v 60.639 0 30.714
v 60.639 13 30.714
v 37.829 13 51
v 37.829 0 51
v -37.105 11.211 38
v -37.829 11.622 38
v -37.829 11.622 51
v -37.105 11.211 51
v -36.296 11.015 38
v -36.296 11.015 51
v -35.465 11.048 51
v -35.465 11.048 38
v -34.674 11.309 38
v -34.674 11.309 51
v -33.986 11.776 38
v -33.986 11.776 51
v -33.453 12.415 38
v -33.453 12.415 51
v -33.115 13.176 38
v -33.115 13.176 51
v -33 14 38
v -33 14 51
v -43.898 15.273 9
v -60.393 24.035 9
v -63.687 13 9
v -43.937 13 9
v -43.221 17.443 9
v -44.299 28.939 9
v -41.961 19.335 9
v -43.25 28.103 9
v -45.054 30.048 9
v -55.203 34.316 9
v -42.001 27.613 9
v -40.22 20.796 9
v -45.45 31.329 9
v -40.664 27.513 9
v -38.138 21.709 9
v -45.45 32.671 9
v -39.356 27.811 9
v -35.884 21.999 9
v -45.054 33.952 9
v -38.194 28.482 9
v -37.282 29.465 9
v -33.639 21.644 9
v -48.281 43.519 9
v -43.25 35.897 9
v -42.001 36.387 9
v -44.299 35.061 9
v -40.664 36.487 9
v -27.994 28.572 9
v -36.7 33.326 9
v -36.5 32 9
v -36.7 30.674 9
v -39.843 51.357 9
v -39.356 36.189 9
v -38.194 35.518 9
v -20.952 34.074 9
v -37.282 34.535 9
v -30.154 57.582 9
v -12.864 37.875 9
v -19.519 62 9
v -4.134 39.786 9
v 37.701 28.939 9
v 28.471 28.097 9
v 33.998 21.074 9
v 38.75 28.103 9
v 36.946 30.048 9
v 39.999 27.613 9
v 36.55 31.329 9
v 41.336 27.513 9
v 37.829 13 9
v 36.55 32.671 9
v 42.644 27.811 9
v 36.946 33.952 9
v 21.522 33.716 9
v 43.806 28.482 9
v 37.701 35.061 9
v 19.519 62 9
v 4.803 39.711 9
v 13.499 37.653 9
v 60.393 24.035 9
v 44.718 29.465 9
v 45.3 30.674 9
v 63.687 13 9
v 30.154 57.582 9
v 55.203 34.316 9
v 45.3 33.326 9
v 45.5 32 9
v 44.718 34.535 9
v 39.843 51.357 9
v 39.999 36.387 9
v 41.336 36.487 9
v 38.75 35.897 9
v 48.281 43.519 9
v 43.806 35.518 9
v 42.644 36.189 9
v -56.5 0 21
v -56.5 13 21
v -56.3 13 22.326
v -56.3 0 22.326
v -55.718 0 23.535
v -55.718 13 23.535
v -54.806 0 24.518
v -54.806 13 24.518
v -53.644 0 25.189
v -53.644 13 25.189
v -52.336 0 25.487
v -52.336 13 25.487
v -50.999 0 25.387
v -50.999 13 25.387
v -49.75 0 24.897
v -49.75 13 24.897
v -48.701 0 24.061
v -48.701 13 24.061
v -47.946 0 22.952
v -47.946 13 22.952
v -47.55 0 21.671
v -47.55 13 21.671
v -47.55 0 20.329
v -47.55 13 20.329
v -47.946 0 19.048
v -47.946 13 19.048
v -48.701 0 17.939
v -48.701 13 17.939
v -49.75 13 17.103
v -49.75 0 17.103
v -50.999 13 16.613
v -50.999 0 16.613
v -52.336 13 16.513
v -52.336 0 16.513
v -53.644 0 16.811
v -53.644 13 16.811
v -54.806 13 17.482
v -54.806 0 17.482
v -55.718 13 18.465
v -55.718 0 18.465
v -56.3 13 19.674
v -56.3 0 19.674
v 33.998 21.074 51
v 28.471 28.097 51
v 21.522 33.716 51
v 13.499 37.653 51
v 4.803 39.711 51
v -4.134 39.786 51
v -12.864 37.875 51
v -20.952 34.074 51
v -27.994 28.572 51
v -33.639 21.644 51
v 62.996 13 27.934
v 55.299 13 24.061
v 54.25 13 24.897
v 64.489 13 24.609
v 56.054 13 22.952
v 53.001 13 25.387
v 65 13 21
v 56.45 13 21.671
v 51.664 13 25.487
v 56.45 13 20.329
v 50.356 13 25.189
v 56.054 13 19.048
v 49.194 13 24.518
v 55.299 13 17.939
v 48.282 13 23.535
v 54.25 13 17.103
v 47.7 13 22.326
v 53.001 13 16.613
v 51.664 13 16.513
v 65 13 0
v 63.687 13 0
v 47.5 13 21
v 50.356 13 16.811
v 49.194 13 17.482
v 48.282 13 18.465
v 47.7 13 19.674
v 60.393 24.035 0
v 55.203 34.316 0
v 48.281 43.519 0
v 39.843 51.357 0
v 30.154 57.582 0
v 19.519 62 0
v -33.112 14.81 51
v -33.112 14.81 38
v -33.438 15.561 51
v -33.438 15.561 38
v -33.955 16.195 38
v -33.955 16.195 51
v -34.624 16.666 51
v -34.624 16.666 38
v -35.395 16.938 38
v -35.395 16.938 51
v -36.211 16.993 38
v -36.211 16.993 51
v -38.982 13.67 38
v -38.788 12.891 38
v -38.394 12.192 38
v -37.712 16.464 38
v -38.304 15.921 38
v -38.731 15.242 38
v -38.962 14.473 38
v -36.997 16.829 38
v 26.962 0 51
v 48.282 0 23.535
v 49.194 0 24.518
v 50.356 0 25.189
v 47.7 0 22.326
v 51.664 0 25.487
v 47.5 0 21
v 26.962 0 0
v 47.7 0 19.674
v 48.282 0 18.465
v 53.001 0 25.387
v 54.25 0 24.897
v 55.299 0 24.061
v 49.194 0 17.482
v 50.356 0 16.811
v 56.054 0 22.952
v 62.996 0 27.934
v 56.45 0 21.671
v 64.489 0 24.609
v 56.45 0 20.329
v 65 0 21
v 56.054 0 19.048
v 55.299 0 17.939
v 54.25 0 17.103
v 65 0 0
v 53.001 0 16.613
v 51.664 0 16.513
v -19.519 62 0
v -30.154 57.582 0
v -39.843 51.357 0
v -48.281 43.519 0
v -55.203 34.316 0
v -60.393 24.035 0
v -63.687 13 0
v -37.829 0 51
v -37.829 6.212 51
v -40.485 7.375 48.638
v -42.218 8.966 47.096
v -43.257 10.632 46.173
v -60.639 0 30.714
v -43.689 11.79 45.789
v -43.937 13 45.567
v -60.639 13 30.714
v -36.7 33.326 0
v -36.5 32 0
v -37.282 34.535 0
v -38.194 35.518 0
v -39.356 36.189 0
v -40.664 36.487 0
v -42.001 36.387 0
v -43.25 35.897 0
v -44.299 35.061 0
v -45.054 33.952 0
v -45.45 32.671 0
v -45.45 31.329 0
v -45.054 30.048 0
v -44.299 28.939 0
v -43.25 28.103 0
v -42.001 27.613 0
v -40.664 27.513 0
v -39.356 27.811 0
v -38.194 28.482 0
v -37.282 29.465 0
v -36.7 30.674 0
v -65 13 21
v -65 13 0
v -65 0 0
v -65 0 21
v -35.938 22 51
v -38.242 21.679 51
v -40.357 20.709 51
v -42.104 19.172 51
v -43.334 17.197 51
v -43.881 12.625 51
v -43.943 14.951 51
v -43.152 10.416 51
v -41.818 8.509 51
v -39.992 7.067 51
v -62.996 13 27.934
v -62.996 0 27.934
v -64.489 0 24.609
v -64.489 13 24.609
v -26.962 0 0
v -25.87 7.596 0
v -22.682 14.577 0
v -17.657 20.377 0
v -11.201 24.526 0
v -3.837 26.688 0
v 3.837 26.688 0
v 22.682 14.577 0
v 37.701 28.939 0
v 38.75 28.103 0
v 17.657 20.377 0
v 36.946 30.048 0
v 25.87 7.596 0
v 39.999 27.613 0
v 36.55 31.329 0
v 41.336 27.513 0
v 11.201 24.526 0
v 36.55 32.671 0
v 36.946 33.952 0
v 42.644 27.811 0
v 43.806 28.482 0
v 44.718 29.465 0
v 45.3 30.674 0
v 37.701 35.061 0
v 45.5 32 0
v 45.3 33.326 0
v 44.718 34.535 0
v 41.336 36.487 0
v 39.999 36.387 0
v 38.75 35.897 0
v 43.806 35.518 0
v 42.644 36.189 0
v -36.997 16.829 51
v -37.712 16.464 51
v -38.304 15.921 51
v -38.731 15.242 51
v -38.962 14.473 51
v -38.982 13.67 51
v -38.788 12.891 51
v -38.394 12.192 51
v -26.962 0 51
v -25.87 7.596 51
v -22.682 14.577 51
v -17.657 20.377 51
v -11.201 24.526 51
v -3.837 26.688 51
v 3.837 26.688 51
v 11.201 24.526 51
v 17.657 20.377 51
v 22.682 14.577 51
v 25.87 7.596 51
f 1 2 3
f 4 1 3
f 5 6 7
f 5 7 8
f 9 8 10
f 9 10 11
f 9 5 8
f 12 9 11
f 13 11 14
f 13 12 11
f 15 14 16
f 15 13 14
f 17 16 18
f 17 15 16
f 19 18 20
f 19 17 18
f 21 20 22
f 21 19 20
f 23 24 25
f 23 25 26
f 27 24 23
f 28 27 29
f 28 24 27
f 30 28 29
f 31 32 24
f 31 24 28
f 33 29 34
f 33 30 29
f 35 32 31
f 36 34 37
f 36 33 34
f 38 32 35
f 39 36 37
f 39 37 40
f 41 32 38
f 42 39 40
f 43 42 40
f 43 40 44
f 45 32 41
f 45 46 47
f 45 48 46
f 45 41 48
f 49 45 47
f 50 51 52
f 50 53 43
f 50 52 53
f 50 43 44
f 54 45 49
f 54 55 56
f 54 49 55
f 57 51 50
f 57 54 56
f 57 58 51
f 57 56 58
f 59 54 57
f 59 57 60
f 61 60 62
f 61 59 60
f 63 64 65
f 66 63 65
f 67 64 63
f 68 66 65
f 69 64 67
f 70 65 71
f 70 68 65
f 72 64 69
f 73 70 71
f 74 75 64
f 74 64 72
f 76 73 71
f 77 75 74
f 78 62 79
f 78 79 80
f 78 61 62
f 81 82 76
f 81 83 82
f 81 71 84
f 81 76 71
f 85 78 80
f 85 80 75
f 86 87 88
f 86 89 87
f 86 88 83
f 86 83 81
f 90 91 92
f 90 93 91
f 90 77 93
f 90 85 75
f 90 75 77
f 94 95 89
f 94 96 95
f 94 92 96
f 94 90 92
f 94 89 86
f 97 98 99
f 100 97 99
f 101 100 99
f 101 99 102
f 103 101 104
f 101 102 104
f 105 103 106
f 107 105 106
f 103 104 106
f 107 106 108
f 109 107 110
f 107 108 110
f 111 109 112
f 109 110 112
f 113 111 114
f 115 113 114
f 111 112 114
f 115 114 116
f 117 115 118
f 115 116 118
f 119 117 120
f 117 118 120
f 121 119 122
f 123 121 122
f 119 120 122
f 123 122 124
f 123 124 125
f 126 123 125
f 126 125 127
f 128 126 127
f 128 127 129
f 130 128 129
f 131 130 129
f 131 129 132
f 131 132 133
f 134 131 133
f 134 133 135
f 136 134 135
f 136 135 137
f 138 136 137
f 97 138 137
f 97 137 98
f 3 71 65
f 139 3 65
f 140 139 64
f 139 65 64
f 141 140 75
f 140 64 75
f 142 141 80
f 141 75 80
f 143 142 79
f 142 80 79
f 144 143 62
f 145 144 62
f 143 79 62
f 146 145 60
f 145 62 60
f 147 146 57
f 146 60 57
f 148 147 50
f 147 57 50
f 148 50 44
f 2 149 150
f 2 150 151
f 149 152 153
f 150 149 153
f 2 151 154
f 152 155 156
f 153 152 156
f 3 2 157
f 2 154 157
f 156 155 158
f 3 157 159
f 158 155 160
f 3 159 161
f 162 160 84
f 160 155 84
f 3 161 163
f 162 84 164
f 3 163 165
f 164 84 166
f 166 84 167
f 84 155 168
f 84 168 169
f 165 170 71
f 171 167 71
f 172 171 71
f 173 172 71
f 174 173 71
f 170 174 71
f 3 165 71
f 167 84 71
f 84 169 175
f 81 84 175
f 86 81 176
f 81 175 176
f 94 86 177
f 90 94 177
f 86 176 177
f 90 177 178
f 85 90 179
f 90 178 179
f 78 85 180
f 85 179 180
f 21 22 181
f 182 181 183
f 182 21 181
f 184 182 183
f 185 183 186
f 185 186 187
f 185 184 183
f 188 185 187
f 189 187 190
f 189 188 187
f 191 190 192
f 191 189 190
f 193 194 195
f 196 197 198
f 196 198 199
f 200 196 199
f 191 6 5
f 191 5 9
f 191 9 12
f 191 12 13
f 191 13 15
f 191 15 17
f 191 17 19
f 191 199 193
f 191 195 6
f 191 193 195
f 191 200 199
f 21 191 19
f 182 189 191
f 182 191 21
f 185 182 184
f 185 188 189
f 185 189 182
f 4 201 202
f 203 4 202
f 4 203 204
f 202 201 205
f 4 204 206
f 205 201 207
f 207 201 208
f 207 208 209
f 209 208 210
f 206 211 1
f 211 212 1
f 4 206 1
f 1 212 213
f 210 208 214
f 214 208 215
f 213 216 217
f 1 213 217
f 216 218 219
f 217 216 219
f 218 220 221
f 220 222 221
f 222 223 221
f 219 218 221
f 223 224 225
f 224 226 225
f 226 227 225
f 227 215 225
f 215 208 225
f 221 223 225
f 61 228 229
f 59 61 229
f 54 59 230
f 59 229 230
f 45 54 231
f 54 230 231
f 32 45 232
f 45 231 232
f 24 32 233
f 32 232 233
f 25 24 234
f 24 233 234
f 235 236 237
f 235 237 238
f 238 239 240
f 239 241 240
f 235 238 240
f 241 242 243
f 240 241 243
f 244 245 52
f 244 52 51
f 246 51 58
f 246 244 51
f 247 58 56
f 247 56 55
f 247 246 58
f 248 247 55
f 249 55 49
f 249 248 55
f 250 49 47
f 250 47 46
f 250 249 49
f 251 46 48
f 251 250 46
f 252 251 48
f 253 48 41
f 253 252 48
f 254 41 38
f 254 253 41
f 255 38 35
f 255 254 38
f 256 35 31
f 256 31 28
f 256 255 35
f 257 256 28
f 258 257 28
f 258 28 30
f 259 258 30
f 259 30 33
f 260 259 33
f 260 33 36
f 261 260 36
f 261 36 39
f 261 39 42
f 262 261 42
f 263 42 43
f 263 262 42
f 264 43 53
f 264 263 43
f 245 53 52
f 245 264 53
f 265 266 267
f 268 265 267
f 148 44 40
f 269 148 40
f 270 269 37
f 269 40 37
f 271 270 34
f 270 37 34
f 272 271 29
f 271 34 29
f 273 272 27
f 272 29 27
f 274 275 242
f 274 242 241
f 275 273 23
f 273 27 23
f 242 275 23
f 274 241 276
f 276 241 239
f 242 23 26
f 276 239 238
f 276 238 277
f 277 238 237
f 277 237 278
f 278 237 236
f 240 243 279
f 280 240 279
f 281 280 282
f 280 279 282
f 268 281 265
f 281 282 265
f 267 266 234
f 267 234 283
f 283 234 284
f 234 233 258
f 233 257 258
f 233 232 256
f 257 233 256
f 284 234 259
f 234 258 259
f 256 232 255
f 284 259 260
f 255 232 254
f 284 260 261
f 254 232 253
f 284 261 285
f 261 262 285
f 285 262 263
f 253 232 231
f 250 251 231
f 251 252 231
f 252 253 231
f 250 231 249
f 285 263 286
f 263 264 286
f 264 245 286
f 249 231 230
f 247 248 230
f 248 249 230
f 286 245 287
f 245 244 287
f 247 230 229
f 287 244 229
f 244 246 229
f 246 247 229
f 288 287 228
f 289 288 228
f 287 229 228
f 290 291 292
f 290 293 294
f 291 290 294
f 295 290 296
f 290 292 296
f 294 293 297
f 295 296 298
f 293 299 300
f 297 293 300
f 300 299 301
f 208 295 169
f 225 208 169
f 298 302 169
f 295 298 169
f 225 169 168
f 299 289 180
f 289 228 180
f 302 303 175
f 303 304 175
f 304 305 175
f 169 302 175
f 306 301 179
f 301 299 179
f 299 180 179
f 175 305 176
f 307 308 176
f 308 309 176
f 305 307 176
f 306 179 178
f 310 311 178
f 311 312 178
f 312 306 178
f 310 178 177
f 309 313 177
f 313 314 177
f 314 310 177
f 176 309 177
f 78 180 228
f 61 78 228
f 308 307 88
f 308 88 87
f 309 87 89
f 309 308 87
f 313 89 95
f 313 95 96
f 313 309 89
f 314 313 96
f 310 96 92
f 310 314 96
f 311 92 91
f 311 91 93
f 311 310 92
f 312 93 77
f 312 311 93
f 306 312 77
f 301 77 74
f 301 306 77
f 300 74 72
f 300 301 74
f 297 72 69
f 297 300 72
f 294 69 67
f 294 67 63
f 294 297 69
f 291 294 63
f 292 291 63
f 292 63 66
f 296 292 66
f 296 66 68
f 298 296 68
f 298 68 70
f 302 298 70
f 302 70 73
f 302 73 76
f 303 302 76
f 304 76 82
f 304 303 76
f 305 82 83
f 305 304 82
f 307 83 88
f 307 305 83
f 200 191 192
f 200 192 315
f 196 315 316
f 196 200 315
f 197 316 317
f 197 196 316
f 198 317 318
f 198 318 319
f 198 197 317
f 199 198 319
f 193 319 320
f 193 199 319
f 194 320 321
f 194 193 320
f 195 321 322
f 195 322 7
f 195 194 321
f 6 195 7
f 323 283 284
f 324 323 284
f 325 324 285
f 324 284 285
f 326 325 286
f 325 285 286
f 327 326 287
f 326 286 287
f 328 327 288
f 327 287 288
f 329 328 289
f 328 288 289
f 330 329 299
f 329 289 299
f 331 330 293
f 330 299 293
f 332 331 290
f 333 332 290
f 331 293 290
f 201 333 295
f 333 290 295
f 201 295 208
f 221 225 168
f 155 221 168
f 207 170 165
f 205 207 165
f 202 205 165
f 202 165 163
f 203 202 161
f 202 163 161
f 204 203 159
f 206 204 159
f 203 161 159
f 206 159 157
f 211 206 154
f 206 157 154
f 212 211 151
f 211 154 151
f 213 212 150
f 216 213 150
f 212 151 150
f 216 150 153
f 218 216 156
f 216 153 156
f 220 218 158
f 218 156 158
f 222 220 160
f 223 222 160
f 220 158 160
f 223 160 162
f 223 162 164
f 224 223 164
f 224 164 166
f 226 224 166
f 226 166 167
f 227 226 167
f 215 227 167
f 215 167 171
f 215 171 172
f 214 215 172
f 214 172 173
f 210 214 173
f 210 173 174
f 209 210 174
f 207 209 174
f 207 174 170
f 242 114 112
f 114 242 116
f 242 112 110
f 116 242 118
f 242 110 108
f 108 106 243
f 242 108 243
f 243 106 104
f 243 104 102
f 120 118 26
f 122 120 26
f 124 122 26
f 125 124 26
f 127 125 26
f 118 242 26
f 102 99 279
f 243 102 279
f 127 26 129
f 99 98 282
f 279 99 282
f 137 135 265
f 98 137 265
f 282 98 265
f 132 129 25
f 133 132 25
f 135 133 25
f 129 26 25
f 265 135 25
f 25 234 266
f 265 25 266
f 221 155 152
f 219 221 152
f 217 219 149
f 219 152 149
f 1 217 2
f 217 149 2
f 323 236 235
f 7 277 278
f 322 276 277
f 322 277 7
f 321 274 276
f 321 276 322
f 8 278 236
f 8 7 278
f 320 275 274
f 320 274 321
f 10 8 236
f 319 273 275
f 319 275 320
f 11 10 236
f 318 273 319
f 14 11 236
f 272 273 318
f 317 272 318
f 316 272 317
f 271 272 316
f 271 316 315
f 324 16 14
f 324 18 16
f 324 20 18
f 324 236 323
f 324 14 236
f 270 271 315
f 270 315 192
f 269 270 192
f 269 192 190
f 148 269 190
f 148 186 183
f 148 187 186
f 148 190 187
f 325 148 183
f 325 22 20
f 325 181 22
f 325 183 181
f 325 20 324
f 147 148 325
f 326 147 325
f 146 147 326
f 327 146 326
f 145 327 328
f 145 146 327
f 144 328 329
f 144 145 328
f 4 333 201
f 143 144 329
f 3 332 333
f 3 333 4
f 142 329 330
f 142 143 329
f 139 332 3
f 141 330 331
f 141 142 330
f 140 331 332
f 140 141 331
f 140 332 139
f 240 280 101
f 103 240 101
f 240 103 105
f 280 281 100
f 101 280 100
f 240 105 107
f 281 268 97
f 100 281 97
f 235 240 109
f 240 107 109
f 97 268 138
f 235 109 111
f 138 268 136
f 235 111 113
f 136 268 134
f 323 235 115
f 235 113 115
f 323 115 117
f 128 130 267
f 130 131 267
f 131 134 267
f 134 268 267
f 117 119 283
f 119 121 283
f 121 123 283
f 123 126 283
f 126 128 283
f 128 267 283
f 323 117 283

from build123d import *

# Parameters (mm, degrees)
SKETCH1_R           = 4.5
BOSS_EXTRUDE1_DEPTH = 9
BOSS_EXTRUDE2_DEPTH = 51
SKETCH2_R           = 4.5
CUT_EXTRUDE1_DEPTH  = 51
SKETCH3_R           = 8
BOSS_EXTRUDE4_DEPTH = 51
SKETCH3_3_R         = 3
CUT_EXTRUDE2_DEPTH  = 13


with BuildPart() as part:
    # Sketch1 → Boss-Extrude1 (new body)
    with BuildSketch(Plane.XY):
        with BuildLine():
            Line((-63.686733312, 13), (-37.828560639, 13))
            ThreePointArc((-37.828560639, 13), (-35.993988141, 17.448003259), (-33.638618871, 21.643551476))
            ThreePointArc((-33.638618871, 21.643551476), (4.802775087, 39.710620135), (37.828560639, 13))
            Line((37.828560639, 13), (63.686733312, 13))
            ThreePointArc((63.686733312, 13), (48.281028578, 43.519447141), (19.519221296, 62))
            Line((19.519221296, 62), (-19.519221296, 62))
            ThreePointArc((-19.519221296, 62), (-48.281028578, 43.519447141), (-63.686733312, 13))
        make_face()
        with Locations((-41, 32)):
            Circle(SKETCH1_R, mode=Mode.SUBTRACT)
        with Locations((41, 32)):
            Circle(SKETCH1_R, mode=Mode.SUBTRACT)
    extrude(amount=BOSS_EXTRUDE1_DEPTH)

    # Sketch1<3> → Boss-Extrude2 (add)
    with BuildSketch(Plane.XY):
        with BuildLine():
            Line((-65, 13), (-65, 0))
            Line((-65, 0), (-26.9625, 0))
            ThreePointArc((-26.9625, 0), (0, 26.9625), (26.9625, 0))
            Line((26.9625, 0), (65, 0))
            Line((65, 0), (65, 13))
            Line((65, 13), (37.828560639, 13))
            ThreePointArc((37.828560639, 13), (0, 40), (-37.828560639, 13))
            Line((-37.828560639, 13), (-65, 13))
        make_face()
    extrude(amount=BOSS_EXTRUDE2_DEPTH)

    # Sketch2 → Cut-Extrude1 (cut)
    with BuildSketch(Plane(origin=(0, 13, 0), x_dir=(1, 0, 0), z_dir=(0, 1, 0))):
        with BuildLine():
            Line((60.639049437, -30.714258841), (37.828560639, -51))
            Line((37.828560639, -51), (65, -51))
            Line((65, -51), (65, -21))
            ThreePointArc((65, -21), (63.859756378, -26.324112946), (60.639049437, -30.714258841))
        make_face()
        with BuildLine():
            Line((-65, -51), (-37.828560639, -51))
            Line((-37.828560639, -51), (-60.639049437, -30.714258841))
            ThreePointArc((-60.639049437, -30.714258841), (-63.859756378, -26.324112946), (-65, -21))
            Line((-65, -21), (-65, -51))
        make_face()
        with Locations((52, -21)):
            Circle(SKETCH2_R)
        with Locations((-52, -21)):
            Circle(SKETCH2_R)
    extrude(amount=-CUT_EXTRUDE1_DEPTH, mode=Mode.SUBTRACT)

    # Sketch3 → Boss-Extrude4 (add)
    with BuildSketch(Plane.XY.offset(51)):
        with Locations((-36, 14)):
            Circle(SKETCH3_R)
    extrude(amount=-BOSS_EXTRUDE4_DEPTH)

    # Sketch3<3> → Cut-Extrude2 (cut)
    with BuildSketch(Plane.XY.offset(51)):
        with Locations((-36, 14)):
            Circle(SKETCH3_3_R)
    extrude(amount=-CUT_EXTRUDE2_DEPTH, mode=Mode.SUBTRACT)


solid = part.part
